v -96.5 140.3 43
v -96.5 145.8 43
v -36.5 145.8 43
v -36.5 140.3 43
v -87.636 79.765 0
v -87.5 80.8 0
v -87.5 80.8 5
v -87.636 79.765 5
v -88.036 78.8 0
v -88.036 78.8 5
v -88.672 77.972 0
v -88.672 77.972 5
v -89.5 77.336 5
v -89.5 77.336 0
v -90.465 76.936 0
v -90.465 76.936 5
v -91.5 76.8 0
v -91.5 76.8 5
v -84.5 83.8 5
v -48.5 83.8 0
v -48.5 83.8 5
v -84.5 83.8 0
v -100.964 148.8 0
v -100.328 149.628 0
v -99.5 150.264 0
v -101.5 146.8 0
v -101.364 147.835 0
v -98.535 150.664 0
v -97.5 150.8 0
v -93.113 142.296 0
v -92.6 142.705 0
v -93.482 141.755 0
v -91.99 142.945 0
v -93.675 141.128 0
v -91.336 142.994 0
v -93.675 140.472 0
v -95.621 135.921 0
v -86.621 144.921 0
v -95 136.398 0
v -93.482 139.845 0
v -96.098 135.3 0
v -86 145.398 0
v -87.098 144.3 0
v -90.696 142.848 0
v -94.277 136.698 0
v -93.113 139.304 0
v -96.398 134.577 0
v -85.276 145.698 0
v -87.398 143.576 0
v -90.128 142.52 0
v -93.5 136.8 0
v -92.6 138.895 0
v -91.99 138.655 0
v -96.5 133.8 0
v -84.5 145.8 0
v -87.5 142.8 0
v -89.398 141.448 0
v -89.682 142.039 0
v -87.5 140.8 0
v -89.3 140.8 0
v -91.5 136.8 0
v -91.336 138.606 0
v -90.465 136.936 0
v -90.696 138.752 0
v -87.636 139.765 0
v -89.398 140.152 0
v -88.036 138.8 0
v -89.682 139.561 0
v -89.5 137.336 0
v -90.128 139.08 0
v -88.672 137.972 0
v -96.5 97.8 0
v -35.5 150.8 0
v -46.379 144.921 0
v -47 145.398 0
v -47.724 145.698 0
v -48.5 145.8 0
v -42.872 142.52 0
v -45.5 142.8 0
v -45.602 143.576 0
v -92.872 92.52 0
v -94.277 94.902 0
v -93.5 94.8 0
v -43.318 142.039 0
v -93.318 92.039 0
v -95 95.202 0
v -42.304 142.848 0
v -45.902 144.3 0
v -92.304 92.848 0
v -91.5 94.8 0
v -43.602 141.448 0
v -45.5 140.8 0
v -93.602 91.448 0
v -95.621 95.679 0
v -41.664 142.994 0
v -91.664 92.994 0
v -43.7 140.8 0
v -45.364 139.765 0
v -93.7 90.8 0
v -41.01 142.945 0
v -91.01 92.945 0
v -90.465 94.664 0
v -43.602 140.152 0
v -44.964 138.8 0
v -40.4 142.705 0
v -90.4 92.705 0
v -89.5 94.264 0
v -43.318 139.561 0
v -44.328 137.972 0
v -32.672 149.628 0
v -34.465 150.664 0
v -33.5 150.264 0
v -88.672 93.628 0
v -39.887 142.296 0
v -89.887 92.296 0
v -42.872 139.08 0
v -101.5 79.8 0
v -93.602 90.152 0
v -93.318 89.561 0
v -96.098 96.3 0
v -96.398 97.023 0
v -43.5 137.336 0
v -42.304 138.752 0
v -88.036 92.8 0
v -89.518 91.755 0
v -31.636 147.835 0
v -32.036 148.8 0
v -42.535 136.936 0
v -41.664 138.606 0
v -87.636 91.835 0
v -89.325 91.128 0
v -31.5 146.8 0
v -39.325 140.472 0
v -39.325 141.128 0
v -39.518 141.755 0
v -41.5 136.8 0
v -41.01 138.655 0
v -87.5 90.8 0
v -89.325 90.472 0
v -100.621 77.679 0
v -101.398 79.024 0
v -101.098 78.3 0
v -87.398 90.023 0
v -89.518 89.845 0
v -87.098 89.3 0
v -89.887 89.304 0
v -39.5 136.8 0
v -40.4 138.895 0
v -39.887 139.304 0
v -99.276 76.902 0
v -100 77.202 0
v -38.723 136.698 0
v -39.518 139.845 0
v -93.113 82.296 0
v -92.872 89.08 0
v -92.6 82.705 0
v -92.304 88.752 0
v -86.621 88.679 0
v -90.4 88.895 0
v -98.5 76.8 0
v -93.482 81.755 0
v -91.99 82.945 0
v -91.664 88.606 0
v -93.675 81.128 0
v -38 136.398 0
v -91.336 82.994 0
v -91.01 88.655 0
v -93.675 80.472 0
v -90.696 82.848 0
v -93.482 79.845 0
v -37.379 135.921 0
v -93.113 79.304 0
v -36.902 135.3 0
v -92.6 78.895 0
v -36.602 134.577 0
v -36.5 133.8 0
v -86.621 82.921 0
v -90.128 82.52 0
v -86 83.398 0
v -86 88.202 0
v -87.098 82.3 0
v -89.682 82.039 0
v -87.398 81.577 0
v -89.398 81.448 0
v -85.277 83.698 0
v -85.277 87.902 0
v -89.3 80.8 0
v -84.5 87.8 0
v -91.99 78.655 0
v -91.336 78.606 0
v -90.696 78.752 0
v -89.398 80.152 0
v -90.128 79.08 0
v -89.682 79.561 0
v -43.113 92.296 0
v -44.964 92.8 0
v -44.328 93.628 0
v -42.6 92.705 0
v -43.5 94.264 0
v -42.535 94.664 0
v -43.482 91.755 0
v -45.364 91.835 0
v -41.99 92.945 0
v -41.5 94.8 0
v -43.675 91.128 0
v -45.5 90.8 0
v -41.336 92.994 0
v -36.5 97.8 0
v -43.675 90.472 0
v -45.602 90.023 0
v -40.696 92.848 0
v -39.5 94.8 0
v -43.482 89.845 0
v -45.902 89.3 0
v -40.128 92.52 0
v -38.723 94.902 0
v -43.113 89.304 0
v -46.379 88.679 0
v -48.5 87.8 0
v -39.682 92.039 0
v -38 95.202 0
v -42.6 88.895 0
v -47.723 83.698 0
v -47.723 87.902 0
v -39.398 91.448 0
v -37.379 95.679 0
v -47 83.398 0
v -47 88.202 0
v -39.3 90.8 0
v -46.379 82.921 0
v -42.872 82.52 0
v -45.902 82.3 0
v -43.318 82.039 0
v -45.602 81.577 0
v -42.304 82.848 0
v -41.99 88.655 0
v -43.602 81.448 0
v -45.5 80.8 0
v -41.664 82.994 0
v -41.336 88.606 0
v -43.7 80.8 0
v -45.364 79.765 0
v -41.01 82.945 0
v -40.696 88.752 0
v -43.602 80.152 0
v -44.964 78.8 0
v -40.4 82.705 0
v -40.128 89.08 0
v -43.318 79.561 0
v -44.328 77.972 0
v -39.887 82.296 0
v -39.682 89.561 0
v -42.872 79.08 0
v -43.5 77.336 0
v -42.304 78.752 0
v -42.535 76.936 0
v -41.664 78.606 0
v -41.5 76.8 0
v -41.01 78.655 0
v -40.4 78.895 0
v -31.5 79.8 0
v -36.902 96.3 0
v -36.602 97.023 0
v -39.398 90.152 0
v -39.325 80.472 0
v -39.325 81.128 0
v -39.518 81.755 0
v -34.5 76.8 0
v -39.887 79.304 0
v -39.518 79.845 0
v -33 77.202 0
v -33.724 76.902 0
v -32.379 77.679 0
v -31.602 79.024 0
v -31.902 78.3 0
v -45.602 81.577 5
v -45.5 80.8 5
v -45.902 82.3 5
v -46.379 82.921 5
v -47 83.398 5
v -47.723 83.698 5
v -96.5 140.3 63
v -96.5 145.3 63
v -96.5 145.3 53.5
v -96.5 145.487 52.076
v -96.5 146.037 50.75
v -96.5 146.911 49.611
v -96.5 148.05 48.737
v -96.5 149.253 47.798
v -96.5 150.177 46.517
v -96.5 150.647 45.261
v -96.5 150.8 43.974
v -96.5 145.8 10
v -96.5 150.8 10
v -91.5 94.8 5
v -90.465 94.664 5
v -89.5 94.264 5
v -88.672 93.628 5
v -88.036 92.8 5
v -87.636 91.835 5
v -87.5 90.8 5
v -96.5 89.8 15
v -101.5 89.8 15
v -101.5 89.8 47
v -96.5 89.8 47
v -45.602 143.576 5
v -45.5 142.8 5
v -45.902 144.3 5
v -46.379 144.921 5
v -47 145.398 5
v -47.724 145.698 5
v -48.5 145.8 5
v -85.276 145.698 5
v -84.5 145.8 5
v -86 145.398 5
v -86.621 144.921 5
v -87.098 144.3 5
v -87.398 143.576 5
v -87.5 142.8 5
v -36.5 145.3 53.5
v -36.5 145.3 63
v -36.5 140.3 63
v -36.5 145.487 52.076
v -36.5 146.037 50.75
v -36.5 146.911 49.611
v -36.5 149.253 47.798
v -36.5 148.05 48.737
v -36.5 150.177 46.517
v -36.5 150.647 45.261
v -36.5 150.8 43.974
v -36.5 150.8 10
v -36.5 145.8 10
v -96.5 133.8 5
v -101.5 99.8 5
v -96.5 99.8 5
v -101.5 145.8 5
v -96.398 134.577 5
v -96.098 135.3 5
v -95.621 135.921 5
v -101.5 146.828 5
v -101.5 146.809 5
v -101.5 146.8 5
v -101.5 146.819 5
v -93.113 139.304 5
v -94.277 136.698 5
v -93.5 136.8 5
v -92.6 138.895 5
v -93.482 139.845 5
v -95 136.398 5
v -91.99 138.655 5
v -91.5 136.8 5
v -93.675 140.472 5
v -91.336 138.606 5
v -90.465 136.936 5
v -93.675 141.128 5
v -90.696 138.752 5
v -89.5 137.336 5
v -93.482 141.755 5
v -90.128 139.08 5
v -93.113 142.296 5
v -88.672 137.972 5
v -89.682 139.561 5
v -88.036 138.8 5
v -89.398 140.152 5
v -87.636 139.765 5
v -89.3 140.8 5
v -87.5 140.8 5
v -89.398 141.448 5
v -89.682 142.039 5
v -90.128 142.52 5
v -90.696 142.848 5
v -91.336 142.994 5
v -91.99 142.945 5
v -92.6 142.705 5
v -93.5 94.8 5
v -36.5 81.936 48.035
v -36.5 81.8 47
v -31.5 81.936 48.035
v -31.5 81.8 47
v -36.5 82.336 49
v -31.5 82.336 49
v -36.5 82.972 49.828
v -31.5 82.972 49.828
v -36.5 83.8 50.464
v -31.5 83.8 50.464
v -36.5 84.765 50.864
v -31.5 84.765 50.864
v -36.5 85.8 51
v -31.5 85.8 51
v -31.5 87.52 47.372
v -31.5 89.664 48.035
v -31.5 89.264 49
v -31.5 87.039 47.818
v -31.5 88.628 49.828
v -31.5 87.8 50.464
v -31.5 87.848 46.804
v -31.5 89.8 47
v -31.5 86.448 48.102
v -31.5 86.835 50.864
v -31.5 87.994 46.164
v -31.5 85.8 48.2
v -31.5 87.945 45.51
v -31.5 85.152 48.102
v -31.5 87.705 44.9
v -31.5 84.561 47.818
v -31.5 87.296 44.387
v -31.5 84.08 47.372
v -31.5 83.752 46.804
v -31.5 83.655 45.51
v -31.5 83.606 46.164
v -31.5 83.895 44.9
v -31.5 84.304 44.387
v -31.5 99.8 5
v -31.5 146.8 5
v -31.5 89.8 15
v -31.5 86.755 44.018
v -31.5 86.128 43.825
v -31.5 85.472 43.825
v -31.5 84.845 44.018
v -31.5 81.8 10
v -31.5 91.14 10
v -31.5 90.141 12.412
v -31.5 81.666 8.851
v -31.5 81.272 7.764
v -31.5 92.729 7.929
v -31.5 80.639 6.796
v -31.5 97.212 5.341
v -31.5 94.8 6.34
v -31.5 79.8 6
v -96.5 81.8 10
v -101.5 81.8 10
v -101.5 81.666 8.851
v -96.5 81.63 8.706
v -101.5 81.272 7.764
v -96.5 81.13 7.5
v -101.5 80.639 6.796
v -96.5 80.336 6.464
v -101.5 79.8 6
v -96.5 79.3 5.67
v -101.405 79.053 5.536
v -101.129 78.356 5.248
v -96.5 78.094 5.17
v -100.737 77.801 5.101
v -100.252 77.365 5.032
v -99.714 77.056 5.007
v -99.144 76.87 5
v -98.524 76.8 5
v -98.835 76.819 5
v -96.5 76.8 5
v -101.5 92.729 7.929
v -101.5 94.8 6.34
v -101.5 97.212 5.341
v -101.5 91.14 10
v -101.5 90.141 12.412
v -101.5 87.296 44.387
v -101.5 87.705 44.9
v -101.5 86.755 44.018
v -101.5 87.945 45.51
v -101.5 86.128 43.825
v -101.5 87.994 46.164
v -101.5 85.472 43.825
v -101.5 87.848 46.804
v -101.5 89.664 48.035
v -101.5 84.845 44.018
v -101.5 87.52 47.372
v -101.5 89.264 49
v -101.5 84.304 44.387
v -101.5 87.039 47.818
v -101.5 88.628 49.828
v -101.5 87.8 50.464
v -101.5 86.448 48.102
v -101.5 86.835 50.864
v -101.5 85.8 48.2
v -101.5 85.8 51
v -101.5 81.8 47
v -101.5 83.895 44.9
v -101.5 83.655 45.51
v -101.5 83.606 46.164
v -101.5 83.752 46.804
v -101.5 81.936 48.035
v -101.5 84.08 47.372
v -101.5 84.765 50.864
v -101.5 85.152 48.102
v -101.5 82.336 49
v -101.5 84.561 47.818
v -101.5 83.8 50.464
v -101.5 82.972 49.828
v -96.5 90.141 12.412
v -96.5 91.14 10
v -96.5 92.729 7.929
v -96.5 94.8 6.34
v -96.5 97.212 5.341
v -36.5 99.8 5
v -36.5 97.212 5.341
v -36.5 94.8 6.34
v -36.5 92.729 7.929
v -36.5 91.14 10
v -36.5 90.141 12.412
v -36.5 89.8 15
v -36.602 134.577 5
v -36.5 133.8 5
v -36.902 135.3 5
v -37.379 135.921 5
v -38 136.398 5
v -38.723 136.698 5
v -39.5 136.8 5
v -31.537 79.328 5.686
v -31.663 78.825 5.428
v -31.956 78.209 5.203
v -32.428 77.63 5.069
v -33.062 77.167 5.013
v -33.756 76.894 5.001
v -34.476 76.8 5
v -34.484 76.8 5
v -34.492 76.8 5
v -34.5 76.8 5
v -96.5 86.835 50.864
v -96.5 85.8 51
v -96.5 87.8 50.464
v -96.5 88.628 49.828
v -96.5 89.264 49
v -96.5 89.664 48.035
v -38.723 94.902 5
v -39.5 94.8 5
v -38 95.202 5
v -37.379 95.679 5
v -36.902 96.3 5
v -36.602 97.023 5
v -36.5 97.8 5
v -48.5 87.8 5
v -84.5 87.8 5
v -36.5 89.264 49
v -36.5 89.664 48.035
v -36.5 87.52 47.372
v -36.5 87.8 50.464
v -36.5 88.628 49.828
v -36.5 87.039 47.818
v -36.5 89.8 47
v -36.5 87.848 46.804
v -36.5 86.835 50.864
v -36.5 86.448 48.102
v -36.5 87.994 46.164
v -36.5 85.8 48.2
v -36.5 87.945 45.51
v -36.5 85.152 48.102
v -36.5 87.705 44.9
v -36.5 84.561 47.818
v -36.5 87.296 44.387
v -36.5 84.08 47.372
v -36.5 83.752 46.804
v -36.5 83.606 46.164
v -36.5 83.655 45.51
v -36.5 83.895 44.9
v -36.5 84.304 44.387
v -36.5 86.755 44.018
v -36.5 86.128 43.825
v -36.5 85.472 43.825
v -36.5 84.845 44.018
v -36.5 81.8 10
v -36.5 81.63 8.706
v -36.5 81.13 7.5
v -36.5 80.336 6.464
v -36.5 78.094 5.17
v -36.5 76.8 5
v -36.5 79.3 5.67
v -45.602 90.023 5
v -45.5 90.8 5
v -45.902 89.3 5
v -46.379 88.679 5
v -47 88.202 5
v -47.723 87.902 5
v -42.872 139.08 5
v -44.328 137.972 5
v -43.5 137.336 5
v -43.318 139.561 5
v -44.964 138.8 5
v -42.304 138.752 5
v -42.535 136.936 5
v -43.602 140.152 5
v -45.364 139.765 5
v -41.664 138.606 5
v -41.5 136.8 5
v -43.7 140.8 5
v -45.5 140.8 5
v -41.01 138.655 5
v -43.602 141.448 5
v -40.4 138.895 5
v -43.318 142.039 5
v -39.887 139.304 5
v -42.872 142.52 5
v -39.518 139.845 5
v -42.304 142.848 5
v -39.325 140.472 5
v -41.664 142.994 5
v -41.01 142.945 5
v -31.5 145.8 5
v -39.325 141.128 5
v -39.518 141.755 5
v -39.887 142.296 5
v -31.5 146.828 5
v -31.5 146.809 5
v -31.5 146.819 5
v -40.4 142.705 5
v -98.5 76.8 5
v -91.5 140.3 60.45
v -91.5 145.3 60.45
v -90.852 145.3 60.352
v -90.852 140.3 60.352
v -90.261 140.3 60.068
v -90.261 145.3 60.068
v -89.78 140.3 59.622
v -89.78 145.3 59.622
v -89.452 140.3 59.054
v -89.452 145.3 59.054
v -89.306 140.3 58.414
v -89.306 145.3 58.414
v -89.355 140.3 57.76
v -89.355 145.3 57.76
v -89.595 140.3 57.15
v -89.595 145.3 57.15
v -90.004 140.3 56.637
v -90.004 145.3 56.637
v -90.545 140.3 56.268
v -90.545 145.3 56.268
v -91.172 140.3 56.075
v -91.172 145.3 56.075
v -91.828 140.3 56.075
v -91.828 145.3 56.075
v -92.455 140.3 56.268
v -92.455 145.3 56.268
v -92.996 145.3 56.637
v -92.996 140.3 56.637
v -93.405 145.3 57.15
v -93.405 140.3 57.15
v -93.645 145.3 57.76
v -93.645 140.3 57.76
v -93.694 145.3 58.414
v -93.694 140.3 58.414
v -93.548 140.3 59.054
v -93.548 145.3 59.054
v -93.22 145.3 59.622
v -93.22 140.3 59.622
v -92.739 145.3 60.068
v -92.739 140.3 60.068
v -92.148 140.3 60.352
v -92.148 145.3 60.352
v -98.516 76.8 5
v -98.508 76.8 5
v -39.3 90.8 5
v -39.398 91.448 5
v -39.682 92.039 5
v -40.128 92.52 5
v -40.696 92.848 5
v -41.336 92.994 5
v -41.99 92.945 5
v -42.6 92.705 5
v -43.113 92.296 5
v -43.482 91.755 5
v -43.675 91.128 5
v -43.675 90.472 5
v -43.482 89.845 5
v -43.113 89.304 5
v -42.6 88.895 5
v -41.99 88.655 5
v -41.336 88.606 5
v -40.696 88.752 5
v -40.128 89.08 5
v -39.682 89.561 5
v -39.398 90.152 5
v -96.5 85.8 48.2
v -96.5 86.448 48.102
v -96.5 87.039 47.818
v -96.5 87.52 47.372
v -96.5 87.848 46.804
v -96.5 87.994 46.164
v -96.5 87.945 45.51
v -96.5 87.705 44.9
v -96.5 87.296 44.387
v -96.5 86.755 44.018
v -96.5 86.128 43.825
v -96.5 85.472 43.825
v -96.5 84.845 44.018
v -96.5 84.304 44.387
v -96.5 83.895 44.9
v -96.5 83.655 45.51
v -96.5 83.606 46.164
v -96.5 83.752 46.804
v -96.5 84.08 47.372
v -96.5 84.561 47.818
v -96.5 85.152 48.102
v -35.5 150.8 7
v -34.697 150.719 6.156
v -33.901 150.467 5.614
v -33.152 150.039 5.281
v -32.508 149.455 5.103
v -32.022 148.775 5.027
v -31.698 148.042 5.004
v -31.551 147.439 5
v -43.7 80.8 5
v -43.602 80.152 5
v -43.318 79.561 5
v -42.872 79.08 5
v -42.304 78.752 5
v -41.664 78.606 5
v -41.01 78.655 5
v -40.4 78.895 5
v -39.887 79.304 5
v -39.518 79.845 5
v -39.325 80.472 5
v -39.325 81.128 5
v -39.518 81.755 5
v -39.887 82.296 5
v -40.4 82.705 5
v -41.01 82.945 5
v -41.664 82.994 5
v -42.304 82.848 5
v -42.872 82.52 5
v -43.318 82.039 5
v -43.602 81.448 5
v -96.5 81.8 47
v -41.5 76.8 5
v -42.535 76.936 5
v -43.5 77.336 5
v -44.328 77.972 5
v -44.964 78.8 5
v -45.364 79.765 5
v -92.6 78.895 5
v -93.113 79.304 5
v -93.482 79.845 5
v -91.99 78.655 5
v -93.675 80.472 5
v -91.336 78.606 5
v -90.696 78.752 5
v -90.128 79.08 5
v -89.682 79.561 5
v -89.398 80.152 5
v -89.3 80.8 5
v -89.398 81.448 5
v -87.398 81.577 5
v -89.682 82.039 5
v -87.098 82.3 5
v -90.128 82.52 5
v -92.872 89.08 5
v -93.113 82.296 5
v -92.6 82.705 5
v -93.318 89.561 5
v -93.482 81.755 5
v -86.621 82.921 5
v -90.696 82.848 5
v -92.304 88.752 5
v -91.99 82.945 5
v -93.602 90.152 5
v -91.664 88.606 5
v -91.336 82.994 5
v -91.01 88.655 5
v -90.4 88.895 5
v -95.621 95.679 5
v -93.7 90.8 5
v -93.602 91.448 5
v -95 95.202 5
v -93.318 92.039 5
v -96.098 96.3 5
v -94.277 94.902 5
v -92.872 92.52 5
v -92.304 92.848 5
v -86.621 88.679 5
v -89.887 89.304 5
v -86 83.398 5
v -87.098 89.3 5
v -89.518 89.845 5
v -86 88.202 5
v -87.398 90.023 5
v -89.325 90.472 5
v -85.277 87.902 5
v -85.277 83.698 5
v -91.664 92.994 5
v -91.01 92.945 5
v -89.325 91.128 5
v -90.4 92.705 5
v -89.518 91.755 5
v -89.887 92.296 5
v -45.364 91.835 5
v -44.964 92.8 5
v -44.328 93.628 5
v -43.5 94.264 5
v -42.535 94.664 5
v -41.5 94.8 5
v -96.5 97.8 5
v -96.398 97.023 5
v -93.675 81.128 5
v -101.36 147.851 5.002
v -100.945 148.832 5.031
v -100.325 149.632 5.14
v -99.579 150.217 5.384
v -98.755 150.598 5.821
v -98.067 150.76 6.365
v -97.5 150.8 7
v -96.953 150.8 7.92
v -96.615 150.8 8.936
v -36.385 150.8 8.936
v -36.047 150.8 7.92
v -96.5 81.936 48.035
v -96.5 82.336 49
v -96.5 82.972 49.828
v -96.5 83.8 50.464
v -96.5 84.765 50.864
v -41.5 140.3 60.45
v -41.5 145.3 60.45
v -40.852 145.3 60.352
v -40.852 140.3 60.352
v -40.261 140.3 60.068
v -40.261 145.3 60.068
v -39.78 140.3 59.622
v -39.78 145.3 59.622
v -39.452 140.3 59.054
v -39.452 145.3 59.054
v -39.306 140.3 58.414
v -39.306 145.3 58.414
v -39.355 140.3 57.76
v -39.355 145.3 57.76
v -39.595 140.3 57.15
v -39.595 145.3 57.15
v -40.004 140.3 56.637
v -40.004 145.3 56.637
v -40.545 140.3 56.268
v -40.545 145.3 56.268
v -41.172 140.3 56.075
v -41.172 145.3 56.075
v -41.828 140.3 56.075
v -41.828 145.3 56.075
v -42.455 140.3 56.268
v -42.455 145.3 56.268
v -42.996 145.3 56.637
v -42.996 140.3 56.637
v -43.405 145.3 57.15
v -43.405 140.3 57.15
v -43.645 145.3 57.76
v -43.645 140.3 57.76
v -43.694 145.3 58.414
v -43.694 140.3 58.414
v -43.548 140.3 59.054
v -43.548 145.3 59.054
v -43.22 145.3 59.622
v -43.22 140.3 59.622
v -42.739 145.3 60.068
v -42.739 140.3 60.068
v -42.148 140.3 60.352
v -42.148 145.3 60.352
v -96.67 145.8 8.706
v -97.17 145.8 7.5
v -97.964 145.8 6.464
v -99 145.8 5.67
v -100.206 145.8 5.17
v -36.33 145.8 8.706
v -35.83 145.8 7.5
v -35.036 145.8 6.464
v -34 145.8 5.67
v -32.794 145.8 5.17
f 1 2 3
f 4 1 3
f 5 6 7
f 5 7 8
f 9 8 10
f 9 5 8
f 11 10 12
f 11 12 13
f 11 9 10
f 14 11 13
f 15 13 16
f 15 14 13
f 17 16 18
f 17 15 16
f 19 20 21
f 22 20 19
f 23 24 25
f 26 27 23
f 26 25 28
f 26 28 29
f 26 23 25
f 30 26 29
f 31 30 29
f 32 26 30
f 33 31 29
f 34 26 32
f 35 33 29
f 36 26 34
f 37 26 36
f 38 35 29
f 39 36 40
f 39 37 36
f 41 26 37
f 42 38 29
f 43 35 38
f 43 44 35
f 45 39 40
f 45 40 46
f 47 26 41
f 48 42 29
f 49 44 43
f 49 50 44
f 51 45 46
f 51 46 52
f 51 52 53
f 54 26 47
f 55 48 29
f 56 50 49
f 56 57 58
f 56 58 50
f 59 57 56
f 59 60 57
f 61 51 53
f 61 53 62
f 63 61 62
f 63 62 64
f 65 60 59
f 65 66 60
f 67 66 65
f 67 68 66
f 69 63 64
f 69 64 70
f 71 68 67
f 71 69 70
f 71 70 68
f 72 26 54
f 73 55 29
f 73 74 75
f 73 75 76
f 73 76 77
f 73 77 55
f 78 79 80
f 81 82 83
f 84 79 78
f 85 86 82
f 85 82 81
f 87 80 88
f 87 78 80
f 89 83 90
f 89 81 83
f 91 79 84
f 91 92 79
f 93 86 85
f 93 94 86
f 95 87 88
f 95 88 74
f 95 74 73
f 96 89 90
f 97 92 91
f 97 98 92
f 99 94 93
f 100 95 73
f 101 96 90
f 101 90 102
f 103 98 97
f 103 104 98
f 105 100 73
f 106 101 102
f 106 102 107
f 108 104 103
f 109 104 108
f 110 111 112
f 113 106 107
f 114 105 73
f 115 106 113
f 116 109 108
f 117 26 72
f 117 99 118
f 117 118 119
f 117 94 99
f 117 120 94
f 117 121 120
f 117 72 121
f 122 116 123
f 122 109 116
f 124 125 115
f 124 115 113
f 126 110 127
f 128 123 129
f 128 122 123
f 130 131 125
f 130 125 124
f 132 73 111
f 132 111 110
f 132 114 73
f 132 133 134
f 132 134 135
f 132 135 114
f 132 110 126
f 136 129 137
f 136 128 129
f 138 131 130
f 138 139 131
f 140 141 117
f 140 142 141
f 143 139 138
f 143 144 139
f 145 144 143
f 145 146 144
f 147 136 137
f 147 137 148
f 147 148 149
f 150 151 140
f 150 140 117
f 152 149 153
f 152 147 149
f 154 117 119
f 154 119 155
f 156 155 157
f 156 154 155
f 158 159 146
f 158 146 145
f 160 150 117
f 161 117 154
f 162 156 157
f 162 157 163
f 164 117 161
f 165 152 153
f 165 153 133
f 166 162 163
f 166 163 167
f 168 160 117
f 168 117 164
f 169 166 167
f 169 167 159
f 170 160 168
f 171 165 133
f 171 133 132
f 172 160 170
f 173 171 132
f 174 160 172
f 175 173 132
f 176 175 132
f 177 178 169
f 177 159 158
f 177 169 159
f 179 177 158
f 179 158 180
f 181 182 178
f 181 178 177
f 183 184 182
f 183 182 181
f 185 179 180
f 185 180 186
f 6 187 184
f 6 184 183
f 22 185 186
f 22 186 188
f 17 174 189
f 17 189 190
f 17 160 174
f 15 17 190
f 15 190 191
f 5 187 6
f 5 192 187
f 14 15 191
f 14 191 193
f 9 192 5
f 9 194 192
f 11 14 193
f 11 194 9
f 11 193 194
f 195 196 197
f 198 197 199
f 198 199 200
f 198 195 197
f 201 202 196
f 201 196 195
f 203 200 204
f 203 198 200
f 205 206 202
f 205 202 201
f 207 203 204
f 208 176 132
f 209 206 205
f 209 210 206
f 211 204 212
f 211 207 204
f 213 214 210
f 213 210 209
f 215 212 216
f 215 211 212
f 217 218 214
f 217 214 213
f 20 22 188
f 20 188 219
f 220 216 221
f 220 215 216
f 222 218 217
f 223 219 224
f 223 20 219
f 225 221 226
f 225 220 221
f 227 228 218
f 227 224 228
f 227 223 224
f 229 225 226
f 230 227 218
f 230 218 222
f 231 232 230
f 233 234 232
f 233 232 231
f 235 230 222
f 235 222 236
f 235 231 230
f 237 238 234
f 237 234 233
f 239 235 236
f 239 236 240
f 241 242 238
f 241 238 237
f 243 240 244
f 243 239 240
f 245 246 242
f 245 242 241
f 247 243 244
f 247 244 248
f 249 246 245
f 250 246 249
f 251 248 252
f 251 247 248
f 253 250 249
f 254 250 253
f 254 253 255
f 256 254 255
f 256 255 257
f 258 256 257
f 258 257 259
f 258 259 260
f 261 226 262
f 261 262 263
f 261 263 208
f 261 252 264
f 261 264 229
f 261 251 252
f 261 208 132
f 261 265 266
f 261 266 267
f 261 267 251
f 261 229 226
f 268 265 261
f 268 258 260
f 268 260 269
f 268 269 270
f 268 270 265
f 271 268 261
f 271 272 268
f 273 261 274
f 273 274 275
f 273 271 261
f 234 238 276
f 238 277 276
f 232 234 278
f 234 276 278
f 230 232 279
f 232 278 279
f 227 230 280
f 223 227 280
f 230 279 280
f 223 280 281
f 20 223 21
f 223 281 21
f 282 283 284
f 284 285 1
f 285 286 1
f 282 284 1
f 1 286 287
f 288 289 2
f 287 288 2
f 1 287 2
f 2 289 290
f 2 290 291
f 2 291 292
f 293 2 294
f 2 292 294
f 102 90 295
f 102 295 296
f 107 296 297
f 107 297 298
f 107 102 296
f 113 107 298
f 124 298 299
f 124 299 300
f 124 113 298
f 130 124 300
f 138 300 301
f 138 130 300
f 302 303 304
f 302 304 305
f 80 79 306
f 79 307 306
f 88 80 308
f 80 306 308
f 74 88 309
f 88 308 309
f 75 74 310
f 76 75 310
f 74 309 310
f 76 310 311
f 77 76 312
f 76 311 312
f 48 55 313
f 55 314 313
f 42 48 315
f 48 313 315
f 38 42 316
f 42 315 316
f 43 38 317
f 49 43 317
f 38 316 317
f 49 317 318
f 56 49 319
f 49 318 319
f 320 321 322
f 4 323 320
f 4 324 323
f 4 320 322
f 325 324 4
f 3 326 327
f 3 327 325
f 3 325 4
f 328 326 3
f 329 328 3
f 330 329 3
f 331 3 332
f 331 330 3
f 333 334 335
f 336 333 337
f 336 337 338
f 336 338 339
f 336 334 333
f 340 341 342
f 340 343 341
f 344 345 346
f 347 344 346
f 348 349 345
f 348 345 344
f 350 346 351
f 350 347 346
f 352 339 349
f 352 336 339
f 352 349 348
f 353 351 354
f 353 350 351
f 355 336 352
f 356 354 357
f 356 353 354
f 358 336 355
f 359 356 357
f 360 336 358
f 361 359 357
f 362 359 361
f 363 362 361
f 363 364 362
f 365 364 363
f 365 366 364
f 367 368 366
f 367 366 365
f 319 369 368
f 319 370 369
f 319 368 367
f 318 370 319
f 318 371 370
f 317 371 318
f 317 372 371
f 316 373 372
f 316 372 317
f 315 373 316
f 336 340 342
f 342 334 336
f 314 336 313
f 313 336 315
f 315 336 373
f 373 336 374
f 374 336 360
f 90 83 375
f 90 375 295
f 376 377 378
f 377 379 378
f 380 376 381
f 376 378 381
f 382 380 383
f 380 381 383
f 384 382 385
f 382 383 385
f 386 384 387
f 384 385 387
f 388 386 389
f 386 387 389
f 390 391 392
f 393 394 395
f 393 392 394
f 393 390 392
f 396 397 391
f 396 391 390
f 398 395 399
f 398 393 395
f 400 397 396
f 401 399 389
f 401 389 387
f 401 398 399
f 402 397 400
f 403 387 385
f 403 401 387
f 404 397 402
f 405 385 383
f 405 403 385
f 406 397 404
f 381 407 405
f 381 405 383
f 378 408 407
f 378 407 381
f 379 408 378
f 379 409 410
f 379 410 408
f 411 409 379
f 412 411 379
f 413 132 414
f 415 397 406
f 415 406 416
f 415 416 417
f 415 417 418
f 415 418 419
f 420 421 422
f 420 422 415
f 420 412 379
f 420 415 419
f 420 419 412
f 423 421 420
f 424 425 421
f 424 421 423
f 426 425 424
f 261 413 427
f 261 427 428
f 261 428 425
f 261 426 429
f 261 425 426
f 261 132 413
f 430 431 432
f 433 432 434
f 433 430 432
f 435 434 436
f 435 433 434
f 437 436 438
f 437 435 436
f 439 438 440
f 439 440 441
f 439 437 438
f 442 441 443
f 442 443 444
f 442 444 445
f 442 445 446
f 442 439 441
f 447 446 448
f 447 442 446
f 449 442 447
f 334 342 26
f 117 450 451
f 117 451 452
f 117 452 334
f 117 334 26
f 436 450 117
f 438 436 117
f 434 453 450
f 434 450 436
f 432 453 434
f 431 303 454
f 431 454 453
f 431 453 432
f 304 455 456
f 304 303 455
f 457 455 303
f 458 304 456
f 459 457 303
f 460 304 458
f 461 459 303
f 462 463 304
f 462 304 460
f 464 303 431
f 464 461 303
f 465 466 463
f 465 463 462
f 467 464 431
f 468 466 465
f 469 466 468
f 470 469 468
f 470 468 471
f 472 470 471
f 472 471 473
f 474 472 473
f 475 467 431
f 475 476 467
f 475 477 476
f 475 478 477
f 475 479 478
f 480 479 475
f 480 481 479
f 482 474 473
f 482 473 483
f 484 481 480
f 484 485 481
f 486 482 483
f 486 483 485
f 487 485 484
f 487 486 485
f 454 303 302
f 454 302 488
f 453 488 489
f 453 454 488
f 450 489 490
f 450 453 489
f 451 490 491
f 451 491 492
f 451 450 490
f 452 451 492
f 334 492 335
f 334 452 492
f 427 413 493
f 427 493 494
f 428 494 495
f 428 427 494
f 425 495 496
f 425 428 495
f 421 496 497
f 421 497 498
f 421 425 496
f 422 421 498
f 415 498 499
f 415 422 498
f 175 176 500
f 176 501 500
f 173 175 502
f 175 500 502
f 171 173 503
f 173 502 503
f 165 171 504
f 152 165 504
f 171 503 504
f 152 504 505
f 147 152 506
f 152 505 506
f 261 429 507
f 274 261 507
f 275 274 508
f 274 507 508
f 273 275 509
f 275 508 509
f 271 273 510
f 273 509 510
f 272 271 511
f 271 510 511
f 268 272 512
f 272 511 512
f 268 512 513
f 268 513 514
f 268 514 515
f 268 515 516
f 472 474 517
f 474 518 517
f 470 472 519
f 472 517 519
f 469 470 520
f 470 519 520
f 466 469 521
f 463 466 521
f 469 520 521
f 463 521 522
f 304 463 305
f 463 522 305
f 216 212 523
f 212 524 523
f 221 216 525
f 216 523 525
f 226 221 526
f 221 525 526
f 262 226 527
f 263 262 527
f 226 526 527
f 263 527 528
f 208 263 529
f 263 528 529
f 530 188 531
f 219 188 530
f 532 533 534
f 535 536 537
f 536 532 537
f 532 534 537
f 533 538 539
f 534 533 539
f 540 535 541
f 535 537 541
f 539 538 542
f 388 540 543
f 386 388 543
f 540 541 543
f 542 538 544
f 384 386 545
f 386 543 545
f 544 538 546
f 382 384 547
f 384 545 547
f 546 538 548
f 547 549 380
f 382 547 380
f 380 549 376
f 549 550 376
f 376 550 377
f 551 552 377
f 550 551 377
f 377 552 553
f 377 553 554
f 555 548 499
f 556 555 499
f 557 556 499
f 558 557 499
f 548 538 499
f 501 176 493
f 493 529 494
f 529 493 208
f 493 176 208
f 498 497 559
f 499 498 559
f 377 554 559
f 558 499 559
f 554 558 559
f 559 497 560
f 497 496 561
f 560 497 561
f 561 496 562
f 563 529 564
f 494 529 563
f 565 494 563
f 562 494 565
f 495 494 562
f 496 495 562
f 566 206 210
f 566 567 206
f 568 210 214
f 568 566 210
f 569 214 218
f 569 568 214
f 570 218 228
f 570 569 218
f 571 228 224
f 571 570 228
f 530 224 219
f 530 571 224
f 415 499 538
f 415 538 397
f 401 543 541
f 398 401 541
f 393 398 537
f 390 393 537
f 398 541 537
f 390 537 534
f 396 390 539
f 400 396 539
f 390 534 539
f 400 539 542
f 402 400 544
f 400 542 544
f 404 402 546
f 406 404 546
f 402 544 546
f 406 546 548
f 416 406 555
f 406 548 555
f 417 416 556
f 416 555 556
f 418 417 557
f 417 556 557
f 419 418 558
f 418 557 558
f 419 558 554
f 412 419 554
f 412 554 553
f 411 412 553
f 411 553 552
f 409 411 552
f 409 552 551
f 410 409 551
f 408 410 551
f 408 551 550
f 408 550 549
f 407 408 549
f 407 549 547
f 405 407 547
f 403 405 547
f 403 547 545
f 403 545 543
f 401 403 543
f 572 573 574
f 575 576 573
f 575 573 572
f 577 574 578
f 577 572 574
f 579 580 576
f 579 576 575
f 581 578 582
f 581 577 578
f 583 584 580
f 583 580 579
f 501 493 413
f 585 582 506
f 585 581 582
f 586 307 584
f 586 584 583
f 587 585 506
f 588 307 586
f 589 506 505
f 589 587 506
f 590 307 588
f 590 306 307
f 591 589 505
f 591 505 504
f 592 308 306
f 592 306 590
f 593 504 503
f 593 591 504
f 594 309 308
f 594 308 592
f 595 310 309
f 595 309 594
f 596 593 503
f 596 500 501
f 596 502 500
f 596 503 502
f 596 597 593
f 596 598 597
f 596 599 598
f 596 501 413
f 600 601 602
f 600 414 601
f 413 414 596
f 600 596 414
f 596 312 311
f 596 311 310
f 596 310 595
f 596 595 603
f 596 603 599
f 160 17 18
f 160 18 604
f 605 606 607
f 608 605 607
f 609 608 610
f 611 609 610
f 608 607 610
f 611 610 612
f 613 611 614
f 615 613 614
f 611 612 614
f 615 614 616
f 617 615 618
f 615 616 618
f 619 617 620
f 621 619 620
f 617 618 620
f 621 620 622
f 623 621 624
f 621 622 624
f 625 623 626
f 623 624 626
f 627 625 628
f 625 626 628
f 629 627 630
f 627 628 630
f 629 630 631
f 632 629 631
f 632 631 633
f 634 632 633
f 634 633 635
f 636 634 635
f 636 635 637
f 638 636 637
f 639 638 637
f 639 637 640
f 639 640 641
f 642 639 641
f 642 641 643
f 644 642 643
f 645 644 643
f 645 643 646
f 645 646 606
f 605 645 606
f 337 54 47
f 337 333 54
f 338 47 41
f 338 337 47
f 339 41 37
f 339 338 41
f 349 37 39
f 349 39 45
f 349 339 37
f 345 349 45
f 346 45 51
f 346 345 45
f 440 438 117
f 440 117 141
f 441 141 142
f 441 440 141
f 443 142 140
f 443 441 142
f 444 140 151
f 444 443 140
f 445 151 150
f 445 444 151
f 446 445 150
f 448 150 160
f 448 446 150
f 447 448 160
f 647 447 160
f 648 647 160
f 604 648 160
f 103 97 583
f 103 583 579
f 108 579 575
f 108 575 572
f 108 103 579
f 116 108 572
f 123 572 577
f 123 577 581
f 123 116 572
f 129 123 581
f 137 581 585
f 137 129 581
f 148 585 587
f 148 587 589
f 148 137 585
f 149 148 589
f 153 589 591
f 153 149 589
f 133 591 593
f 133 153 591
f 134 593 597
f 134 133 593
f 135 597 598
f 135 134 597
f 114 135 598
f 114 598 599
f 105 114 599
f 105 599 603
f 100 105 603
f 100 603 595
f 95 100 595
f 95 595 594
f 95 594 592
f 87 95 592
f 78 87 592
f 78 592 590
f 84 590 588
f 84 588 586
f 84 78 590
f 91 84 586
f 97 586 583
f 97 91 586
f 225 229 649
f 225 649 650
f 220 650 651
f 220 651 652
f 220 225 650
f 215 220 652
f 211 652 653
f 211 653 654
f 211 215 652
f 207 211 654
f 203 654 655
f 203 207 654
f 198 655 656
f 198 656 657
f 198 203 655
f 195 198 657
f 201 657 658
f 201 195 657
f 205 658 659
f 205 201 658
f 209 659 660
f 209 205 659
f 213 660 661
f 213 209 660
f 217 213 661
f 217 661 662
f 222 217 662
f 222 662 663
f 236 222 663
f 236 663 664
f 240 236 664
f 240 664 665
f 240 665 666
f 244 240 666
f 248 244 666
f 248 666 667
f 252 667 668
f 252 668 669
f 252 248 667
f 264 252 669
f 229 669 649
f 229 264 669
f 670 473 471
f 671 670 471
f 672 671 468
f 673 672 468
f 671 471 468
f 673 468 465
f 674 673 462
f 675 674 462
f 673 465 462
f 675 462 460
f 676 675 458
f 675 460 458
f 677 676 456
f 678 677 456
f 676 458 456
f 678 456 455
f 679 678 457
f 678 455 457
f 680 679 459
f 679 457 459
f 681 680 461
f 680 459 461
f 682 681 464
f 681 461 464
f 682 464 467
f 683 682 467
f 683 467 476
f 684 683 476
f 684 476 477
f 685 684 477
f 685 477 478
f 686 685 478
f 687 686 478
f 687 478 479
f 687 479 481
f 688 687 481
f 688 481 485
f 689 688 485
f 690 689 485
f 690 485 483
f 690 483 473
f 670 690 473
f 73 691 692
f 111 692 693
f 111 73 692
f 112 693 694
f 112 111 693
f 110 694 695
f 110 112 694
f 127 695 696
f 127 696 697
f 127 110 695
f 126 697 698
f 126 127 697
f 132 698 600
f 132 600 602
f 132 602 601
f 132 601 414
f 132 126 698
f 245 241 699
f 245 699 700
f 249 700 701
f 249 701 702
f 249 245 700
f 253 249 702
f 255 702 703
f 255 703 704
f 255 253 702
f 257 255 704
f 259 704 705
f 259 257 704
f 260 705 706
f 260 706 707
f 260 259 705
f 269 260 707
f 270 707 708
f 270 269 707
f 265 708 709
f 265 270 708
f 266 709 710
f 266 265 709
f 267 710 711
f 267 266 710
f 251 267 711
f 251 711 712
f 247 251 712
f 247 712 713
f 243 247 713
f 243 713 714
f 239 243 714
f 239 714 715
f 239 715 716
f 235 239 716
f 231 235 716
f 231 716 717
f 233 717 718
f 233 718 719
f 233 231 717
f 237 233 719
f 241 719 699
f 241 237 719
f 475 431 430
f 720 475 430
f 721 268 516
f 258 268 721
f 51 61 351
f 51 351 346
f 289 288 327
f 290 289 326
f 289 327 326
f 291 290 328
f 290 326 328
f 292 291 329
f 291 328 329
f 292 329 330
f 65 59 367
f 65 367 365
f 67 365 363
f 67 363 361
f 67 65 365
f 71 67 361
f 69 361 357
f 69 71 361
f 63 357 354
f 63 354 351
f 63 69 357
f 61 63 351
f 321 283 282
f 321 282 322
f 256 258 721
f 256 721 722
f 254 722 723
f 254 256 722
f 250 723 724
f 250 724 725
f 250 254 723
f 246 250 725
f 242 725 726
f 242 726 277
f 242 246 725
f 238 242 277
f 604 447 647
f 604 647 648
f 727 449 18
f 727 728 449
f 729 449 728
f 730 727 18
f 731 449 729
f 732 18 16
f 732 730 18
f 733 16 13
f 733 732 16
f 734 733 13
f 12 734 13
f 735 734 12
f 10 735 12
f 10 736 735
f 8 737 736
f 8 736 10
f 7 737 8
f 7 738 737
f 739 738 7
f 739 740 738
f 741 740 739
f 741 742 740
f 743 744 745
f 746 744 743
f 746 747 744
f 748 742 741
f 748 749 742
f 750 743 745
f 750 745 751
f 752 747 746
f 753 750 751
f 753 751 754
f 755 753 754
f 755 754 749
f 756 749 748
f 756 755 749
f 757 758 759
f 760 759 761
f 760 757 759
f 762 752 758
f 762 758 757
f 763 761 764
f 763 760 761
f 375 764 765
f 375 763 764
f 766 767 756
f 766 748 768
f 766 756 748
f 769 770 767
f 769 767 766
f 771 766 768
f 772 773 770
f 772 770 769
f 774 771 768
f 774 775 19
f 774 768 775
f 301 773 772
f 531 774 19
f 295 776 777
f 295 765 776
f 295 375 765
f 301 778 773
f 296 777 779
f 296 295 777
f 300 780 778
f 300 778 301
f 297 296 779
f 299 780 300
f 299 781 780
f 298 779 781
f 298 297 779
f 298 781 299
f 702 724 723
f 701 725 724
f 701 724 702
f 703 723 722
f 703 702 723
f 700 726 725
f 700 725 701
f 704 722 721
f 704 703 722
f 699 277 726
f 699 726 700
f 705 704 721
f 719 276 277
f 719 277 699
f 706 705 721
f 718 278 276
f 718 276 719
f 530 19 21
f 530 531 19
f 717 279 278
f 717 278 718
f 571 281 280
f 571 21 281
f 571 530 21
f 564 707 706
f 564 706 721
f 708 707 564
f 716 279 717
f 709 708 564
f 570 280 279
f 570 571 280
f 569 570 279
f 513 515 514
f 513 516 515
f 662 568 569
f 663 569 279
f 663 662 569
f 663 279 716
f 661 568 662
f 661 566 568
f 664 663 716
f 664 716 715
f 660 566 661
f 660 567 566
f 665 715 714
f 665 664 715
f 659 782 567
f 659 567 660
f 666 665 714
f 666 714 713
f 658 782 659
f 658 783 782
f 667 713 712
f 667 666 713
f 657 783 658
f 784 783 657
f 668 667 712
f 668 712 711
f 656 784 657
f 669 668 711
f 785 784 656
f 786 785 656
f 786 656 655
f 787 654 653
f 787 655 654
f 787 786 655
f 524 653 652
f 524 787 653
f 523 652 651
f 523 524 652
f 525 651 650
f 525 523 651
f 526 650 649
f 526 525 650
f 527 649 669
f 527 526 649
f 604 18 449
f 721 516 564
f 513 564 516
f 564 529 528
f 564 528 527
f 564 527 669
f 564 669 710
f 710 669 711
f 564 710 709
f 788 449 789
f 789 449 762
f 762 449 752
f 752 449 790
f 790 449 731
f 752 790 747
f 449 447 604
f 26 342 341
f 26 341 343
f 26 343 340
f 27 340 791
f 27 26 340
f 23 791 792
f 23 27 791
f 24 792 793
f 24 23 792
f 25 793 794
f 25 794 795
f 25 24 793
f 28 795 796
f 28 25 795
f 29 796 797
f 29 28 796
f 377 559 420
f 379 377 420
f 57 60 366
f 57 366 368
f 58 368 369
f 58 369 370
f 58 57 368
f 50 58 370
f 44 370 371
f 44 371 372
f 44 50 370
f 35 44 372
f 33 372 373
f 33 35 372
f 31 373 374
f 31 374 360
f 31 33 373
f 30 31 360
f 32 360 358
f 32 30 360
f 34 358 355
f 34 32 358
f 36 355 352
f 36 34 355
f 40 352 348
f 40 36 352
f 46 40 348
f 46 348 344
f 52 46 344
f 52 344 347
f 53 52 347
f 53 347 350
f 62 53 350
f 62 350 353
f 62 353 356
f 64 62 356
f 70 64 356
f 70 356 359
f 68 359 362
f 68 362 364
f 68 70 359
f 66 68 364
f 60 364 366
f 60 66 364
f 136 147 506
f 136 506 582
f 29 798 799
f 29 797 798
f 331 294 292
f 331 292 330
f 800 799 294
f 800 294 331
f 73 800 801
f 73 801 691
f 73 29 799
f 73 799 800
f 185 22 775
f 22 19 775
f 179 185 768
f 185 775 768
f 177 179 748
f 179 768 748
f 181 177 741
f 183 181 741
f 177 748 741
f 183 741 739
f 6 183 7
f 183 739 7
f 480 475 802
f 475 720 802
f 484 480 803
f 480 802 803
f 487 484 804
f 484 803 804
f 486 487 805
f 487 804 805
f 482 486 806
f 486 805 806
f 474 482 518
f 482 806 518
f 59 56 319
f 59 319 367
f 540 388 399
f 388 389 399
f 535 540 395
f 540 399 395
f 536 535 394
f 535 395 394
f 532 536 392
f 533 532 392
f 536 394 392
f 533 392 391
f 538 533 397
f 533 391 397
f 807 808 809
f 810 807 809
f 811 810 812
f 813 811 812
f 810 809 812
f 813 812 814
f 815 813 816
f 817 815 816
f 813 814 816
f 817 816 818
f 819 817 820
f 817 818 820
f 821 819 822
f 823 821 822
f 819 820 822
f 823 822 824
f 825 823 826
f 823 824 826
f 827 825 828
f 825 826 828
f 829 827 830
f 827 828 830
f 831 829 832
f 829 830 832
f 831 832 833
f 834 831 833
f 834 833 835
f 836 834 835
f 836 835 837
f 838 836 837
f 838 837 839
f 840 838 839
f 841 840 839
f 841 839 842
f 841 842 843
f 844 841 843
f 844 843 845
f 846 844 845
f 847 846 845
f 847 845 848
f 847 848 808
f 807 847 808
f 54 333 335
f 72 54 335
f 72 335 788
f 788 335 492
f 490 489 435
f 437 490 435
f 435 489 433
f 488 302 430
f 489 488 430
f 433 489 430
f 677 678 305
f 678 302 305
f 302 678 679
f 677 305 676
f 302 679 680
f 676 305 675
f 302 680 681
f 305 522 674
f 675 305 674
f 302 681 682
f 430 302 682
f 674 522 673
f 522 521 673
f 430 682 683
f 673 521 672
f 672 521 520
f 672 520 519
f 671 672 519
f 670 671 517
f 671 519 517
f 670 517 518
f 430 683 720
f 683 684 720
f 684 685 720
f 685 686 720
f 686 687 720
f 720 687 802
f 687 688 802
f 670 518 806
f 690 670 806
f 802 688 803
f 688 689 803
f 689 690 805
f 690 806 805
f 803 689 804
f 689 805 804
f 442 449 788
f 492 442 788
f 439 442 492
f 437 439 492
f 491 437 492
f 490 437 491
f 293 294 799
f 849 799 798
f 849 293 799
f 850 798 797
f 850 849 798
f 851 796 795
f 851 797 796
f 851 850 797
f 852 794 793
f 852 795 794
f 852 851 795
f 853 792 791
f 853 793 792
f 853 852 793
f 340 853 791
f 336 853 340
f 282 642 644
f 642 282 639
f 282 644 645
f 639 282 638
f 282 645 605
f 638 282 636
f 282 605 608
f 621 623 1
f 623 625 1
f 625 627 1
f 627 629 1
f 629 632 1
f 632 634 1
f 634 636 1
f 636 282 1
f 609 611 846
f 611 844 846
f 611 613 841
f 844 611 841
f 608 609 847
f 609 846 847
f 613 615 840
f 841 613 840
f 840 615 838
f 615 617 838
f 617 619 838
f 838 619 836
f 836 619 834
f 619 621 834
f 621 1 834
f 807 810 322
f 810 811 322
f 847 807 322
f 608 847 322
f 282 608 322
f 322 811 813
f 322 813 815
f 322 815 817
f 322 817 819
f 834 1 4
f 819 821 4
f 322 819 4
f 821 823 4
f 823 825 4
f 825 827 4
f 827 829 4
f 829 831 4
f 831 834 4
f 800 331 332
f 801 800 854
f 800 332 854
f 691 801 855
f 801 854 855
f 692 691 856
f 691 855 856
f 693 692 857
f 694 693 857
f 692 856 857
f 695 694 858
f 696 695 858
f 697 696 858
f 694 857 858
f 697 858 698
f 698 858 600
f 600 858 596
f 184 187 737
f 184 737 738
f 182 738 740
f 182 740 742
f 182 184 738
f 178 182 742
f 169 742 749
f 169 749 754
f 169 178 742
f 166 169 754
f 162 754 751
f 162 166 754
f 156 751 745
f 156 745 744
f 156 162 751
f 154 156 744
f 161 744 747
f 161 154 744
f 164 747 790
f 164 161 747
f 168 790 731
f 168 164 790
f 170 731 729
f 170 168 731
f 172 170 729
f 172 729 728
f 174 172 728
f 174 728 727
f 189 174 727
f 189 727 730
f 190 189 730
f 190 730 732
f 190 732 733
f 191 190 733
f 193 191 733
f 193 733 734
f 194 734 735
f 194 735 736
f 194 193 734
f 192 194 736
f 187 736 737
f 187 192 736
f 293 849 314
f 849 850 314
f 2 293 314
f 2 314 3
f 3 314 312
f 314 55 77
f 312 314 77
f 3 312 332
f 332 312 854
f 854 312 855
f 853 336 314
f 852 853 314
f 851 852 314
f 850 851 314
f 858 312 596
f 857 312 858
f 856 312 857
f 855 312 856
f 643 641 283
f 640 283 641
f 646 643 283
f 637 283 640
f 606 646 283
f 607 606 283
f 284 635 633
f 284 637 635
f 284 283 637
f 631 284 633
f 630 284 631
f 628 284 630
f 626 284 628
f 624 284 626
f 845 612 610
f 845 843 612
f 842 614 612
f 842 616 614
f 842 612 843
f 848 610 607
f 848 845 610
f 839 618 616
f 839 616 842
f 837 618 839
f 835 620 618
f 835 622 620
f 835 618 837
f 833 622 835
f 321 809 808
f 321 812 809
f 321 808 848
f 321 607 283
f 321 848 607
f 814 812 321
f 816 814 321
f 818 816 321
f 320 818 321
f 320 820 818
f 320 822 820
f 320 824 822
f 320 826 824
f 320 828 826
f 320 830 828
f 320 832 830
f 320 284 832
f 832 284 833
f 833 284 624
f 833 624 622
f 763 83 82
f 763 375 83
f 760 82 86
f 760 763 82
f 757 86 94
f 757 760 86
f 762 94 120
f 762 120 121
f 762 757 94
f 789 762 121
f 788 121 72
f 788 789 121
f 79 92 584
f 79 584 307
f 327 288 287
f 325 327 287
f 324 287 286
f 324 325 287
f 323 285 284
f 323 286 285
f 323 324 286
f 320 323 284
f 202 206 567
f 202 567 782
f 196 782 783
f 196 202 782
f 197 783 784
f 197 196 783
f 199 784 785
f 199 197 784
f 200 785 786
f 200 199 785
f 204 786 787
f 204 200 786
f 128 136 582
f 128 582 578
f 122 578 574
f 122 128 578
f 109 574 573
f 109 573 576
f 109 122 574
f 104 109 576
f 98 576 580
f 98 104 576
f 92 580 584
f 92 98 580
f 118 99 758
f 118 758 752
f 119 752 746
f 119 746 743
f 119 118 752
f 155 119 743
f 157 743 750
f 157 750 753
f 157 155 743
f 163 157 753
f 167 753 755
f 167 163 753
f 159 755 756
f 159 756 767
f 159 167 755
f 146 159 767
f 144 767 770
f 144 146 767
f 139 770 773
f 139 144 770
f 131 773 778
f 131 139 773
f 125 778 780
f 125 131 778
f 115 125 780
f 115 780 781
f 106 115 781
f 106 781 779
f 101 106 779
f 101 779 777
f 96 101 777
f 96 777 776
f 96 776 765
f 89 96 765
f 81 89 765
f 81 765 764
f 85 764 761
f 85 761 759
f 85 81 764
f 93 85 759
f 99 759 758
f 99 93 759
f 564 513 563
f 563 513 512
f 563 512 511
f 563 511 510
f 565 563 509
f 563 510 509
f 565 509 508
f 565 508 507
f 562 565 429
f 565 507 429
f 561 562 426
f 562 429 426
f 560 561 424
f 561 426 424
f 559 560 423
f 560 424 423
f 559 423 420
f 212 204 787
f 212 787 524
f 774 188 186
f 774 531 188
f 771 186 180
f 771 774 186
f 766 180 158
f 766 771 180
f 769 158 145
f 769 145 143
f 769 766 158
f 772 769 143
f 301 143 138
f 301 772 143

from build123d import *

# Parameters (mm, degrees)
SKETCH1_R           = 2.2
BOSS_EXTRUDE1_DEPTH = 5
FILLET1_R           = 3
FILLET2_R           = 3
SKETCH2_W           = 70
SKETCH2_H           = 43
BOSS_EXTRUDE2_DEPTH = 5
SKETCH3_W           = 70
SKETCH3_H           = 10.5
BOSS_EXTRUDE3_DEPTH = 5
SKETCH4_W           = 70
SKETCH4_H           = 5
BOSS_EXTRUDE4_DEPTH = 15
FILLET3_R           = 5.5
SKETCH6_W           = 5
SKETCH6_H           = 58
CUT_EXTRUDE1_DEPTH  = 15
FILLET4_R           = 5.5
FILLET5_R           = 5
SKETCH7_R           = 2.2
CUT_EXTRUDE2_DEPTH  = 15
SKETCH8_W           = 5
SKETCH8_H           = 8
BOSS_EXTRUDE5_DEPTH = 46
FILLET7_R           = 10
FILLET8_R           = 3
FILLET9_R           = 5
SKETCH10_R          = 2.2
CUT_EXTRUDE3_DEPTH  = 178.791001057
FILLET10_R          = 4
FILLET11_R          = 4
FILLET12_R          = 4


# Some blends are built 0.0001 mm under size
with BuildPart() as part:
    # Sketch1 → Boss-Extrude1 (new body)
    with BuildSketch(Plane.XY):
        with BuildLine():
            Line((-45.5, 87.8), (-45.5, 90.8))
            ThreePointArc((-45.5, 90.8), (-44.328427125, 93.628427125), (-41.5, 94.8))
            Line((-41.5, 94.8), (-36.5, 94.8))
            Line((-36.5, 94.8), (-36.5, 136.8))
            Line((-36.5, 136.8), (-41.5, 136.8))
            ThreePointArc((-41.5, 136.8), (-44.328427125, 137.971572875), (-45.5, 140.8))
            Line((-45.5, 140.8), (-45.5, 145.8))
            Line((-45.5, 145.8), (-36.5, 145.8))
            Line((-36.5, 145.8), (-31.5, 145.8))
            Line((-31.5, 145.8), (-31.5, 76.8))
            Line((-31.5, 76.8), (-36.5, 76.8))
            Line((-36.5, 76.8), (-41.5, 76.8))
            ThreePointArc((-41.5, 76.8), (-44.328427125, 77.971572875), (-45.5, 80.8))
            Line((-45.5, 80.8), (-45.5, 83.8))
            Line((-45.5, 83.8), (-87.5, 83.8))
            Line((-87.5, 83.8), (-87.5, 80.8))
            ThreePointArc((-87.5, 80.8), (-88.671572875, 77.971572875), (-91.5, 76.8))
            Line((-91.5, 76.8), (-96.5, 76.8))
            Line((-96.5, 76.8), (-101.5, 76.8))
            Line((-101.5, 76.8), (-101.5, 145.8))
            Line((-101.5, 145.8), (-96.5, 145.8))
            Line((-96.5, 145.8), (-87.5, 145.8))
            Line((-87.5, 145.8), (-87.5, 140.8))
            ThreePointArc((-87.5, 140.8), (-88.671572875, 137.971572875), (-91.5, 136.8))
            Line((-91.5, 136.8), (-96.5, 136.8))
            Line((-96.5, 136.8), (-96.5, 94.8))
            Line((-96.5, 94.8), (-91.5, 94.8))
            ThreePointArc((-91.5, 94.8), (-88.671572875, 93.628427125), (-87.5, 90.8))
            Line((-87.5, 90.8), (-87.5, 87.8))
            Line((-87.5, 87.8), (-45.5, 87.8))
        make_face()
        with Locations((-91.5, 140.8)):
            Circle(SKETCH1_R, mode=Mode.SUBTRACT)
        with Locations(Location((-41.5, 140.8, 0), (0, 0, 180))):
            Circle(SKETCH1_R, mode=Mode.SUBTRACT)
        with Locations((-41.5, 90.8)):
            Circle(SKETCH1_R, mode=Mode.SUBTRACT)
        with Locations(Location((-91.5, 90.8, 0), (0, 0, 180))):
            Circle(SKETCH1_R, mode=Mode.SUBTRACT)
        with Locations((-91.5, 80.8)):
            Circle(SKETCH1_R, mode=Mode.SUBTRACT)
        with Locations(Location((-41.5, 80.8, 0), (0, 0, 180))):
            Circle(SKETCH1_R, mode=Mode.SUBTRACT)
    extrude(amount=BOSS_EXTRUDE1_DEPTH)

    # Fillet1
    fillet1_edges = [part.edges().sort_by_distance(p)[0] for p in [
        (-36.5, 136.8, 2.5),
        (-96.5, 136.8, 2.5),
        (-36.5, 94.8, 2.5),
        (-45.5, 87.8, 2.5),
        (-45.5, 83.8, 2.5),
        (-87.5, 83.8, 2.5),
        (-87.5, 87.8, 2.5),
        (-96.5, 94.8, 2.5),
    ]]
    fillet(fillet1_edges, radius=FILLET1_R - 0.0001)  # a hair under: the kernel refuses the full size

    # Fillet2
    fillet2_edges = [part.edges().sort_by_distance(p)[0] for p in [
        (-31.5, 76.8, 2.5),
        (-101.5, 76.8, 2.5),
    ]]
    fillet(fillet2_edges, radius=FILLET2_R)

    # Sketch2 → Boss-Extrude2 (add)
    with BuildSketch(Plane(origin=(0, 145.8, 0), x_dir=(1, 0, 0), z_dir=(0, 1, 0))):
        with Locations((-66.5, -21.5)):
            Rectangle(SKETCH2_W, SKETCH2_H)
    extrude(amount=BOSS_EXTRUDE2_DEPTH)

    # Sketch3 → Boss-Extrude3 (add)
    with BuildSketch(Plane.XY.offset(43)):
        with Locations((-66.5, 145.55)):
            Rectangle(SKETCH3_W, SKETCH3_H)
    extrude(amount=BOSS_EXTRUDE3_DEPTH)

    # Sketch4 → Boss-Extrude4 (add)
    with BuildSketch(Plane.XY.offset(48)):
        with Locations((-66.5, 142.8)):
            Rectangle(SKETCH4_W, SKETCH4_H)
    extrude(amount=BOSS_EXTRUDE4_DEPTH)

    # Fillet3
    fillet3_edges = [part.edges().sort_by_distance(p)[0] for p in [
        (-66.5, 145.3, 48),
    ]]
    fillet(fillet3_edges, radius=FILLET3_R - 0.0001)  # a hair under: the kernel refuses the full size

    # Sketch6 → Cut-Extrude1 (cut)
    with BuildSketch(Plane(origin=(0, 150.8, 0), x_dir=(1, 0, 0), z_dir=(0, 1, 0))):
        with Locations((-99, -34)):
            Rectangle(SKETCH6_W, SKETCH6_H)
        with Locations((-34, -34)):
            Rectangle(SKETCH6_W, SKETCH6_H)
    extrude(amount=-CUT_EXTRUDE1_DEPTH, mode=Mode.SUBTRACT)

    # Fillet4
    fillet4_edges = [part.edges().sort_by_distance(p)[0] for p in [
        (-66.5, 150.8, 48),
    ]]
    fillet(fillet4_edges, radius=FILLET4_R)

    # Fillet5
    fillet5_edges = [part.edges().sort_by_distance(p)[0] for p in [
        (-36.5, 148.3, 5),
        (-96.5, 148.3, 5),
    ]]
    fillet(fillet5_edges, radius=FILLET5_R - 0.0001)  # a hair under: the kernel refuses the full size

    # Sketch7 → Cut-Extrude2 (cut)
    with BuildSketch(Plane(origin=(0, 145.3, 0), x_dir=(1, 0, 0), z_dir=(0, 1, 0))):
        with Locations(Location((-91.5, -58.25, 0), (0, 0, 270))):
            Circle(SKETCH7_R)
        with Locations(Location((-41.5, -58.25, 0), (0, 0, 270))):
            Circle(SKETCH7_R)
    extrude(amount=-CUT_EXTRUDE2_DEPTH, mode=Mode.SUBTRACT)

    # Sketch8 → Boss-Extrude5 (add)
    with BuildSketch(Plane.XY.offset(5)):
        with Locations((-99, 85.8)):
            Rectangle(SKETCH8_W, SKETCH8_H)
        with Locations((-34, 85.8)):
            Rectangle(SKETCH8_W, SKETCH8_H)
    extrude(amount=BOSS_EXTRUDE5_DEPTH)

    # Fillet7
    # the kernel refuses this fillet: 10 mm, written as the material it adds along each edge
    with BuildSketch(Plane(origin=(-101.5, 89.8, 5), x_dir=(0, 1, 0), z_dir=(1, 0, 0))) as fillet7_piece_1:
        with BuildLine():
            CenterArc((FILLET7_R, FILLET7_R), FILLET7_R, 180, 90)
            Line((0, FILLET7_R), (0, 0))
            Line((0, 0), (FILLET7_R, 0))
        make_face()
    extrude(amount=5)
    with BuildSketch(Plane(origin=(-31.5, 89.8, 5), x_dir=(0, 1, 0), z_dir=(-1, 0, 0))) as fillet7_piece_2:
        with BuildLine():
            CenterArc((FILLET7_R, -FILLET7_R), FILLET7_R, 90, 90)
            Line((0, -FILLET7_R), (0, 0))
            Line((0, 0), (FILLET7_R, 0))
        make_face()
    extrude(amount=5)

    # Fillet8
    fillet8_edges = [part.edges().sort_by_distance(p)[0] for p in [
        (-87.5, 145.8, 2.5),
        (-45.5, 145.8, 2.5),
    ]]
    fillet(fillet8_edges, radius=FILLET8_R)

    # Fillet9
    fillet9_edges = [part.edges().sort_by_distance(p)[0] for p in [
        (-34, 81.8, 5),
        (-99, 81.8, 5),
    ]]
    fillet(fillet9_edges, radius=FILLET9_R - 0.0001)  # a hair under: the kernel refuses the full size

    # Sketch10 → Cut-Extrude3 (cut, through all)
    with BuildSketch(Plane.ZY.offset(101.5)):
        with Locations((46, 85.8)):
            Circle(SKETCH10_R)
    extrude(amount=-CUT_EXTRUDE3_DEPTH, mode=Mode.SUBTRACT)

    # Fillet10
    fillet10_edges = [part.edges().sort_by_distance(p)[0] for p in [
        (-99, 81.8, 51),
        (-99, 89.8, 51),
        (-34, 81.8, 51),
        (-34, 89.8, 51),
    ]]
    fillet(fillet10_edges, radius=FILLET10_R - 0.0001)  # a hair under: the kernel refuses the full size

    # Fillet11
    fillet11_edges = [part.edges().sort_by_distance(p)[0] for p in [
        (-101.5, 150.8, 2.5),
    ]]
    fillet(fillet11_edges, radius=FILLET11_R)

    # Fillet12
    fillet12_edges = [part.edges().sort_by_distance(p)[0] for p in [
        (-31.5, 150.8, 2.5),
    ]]
    fillet(fillet12_edges, radius=FILLET12_R)


solid = part.part
